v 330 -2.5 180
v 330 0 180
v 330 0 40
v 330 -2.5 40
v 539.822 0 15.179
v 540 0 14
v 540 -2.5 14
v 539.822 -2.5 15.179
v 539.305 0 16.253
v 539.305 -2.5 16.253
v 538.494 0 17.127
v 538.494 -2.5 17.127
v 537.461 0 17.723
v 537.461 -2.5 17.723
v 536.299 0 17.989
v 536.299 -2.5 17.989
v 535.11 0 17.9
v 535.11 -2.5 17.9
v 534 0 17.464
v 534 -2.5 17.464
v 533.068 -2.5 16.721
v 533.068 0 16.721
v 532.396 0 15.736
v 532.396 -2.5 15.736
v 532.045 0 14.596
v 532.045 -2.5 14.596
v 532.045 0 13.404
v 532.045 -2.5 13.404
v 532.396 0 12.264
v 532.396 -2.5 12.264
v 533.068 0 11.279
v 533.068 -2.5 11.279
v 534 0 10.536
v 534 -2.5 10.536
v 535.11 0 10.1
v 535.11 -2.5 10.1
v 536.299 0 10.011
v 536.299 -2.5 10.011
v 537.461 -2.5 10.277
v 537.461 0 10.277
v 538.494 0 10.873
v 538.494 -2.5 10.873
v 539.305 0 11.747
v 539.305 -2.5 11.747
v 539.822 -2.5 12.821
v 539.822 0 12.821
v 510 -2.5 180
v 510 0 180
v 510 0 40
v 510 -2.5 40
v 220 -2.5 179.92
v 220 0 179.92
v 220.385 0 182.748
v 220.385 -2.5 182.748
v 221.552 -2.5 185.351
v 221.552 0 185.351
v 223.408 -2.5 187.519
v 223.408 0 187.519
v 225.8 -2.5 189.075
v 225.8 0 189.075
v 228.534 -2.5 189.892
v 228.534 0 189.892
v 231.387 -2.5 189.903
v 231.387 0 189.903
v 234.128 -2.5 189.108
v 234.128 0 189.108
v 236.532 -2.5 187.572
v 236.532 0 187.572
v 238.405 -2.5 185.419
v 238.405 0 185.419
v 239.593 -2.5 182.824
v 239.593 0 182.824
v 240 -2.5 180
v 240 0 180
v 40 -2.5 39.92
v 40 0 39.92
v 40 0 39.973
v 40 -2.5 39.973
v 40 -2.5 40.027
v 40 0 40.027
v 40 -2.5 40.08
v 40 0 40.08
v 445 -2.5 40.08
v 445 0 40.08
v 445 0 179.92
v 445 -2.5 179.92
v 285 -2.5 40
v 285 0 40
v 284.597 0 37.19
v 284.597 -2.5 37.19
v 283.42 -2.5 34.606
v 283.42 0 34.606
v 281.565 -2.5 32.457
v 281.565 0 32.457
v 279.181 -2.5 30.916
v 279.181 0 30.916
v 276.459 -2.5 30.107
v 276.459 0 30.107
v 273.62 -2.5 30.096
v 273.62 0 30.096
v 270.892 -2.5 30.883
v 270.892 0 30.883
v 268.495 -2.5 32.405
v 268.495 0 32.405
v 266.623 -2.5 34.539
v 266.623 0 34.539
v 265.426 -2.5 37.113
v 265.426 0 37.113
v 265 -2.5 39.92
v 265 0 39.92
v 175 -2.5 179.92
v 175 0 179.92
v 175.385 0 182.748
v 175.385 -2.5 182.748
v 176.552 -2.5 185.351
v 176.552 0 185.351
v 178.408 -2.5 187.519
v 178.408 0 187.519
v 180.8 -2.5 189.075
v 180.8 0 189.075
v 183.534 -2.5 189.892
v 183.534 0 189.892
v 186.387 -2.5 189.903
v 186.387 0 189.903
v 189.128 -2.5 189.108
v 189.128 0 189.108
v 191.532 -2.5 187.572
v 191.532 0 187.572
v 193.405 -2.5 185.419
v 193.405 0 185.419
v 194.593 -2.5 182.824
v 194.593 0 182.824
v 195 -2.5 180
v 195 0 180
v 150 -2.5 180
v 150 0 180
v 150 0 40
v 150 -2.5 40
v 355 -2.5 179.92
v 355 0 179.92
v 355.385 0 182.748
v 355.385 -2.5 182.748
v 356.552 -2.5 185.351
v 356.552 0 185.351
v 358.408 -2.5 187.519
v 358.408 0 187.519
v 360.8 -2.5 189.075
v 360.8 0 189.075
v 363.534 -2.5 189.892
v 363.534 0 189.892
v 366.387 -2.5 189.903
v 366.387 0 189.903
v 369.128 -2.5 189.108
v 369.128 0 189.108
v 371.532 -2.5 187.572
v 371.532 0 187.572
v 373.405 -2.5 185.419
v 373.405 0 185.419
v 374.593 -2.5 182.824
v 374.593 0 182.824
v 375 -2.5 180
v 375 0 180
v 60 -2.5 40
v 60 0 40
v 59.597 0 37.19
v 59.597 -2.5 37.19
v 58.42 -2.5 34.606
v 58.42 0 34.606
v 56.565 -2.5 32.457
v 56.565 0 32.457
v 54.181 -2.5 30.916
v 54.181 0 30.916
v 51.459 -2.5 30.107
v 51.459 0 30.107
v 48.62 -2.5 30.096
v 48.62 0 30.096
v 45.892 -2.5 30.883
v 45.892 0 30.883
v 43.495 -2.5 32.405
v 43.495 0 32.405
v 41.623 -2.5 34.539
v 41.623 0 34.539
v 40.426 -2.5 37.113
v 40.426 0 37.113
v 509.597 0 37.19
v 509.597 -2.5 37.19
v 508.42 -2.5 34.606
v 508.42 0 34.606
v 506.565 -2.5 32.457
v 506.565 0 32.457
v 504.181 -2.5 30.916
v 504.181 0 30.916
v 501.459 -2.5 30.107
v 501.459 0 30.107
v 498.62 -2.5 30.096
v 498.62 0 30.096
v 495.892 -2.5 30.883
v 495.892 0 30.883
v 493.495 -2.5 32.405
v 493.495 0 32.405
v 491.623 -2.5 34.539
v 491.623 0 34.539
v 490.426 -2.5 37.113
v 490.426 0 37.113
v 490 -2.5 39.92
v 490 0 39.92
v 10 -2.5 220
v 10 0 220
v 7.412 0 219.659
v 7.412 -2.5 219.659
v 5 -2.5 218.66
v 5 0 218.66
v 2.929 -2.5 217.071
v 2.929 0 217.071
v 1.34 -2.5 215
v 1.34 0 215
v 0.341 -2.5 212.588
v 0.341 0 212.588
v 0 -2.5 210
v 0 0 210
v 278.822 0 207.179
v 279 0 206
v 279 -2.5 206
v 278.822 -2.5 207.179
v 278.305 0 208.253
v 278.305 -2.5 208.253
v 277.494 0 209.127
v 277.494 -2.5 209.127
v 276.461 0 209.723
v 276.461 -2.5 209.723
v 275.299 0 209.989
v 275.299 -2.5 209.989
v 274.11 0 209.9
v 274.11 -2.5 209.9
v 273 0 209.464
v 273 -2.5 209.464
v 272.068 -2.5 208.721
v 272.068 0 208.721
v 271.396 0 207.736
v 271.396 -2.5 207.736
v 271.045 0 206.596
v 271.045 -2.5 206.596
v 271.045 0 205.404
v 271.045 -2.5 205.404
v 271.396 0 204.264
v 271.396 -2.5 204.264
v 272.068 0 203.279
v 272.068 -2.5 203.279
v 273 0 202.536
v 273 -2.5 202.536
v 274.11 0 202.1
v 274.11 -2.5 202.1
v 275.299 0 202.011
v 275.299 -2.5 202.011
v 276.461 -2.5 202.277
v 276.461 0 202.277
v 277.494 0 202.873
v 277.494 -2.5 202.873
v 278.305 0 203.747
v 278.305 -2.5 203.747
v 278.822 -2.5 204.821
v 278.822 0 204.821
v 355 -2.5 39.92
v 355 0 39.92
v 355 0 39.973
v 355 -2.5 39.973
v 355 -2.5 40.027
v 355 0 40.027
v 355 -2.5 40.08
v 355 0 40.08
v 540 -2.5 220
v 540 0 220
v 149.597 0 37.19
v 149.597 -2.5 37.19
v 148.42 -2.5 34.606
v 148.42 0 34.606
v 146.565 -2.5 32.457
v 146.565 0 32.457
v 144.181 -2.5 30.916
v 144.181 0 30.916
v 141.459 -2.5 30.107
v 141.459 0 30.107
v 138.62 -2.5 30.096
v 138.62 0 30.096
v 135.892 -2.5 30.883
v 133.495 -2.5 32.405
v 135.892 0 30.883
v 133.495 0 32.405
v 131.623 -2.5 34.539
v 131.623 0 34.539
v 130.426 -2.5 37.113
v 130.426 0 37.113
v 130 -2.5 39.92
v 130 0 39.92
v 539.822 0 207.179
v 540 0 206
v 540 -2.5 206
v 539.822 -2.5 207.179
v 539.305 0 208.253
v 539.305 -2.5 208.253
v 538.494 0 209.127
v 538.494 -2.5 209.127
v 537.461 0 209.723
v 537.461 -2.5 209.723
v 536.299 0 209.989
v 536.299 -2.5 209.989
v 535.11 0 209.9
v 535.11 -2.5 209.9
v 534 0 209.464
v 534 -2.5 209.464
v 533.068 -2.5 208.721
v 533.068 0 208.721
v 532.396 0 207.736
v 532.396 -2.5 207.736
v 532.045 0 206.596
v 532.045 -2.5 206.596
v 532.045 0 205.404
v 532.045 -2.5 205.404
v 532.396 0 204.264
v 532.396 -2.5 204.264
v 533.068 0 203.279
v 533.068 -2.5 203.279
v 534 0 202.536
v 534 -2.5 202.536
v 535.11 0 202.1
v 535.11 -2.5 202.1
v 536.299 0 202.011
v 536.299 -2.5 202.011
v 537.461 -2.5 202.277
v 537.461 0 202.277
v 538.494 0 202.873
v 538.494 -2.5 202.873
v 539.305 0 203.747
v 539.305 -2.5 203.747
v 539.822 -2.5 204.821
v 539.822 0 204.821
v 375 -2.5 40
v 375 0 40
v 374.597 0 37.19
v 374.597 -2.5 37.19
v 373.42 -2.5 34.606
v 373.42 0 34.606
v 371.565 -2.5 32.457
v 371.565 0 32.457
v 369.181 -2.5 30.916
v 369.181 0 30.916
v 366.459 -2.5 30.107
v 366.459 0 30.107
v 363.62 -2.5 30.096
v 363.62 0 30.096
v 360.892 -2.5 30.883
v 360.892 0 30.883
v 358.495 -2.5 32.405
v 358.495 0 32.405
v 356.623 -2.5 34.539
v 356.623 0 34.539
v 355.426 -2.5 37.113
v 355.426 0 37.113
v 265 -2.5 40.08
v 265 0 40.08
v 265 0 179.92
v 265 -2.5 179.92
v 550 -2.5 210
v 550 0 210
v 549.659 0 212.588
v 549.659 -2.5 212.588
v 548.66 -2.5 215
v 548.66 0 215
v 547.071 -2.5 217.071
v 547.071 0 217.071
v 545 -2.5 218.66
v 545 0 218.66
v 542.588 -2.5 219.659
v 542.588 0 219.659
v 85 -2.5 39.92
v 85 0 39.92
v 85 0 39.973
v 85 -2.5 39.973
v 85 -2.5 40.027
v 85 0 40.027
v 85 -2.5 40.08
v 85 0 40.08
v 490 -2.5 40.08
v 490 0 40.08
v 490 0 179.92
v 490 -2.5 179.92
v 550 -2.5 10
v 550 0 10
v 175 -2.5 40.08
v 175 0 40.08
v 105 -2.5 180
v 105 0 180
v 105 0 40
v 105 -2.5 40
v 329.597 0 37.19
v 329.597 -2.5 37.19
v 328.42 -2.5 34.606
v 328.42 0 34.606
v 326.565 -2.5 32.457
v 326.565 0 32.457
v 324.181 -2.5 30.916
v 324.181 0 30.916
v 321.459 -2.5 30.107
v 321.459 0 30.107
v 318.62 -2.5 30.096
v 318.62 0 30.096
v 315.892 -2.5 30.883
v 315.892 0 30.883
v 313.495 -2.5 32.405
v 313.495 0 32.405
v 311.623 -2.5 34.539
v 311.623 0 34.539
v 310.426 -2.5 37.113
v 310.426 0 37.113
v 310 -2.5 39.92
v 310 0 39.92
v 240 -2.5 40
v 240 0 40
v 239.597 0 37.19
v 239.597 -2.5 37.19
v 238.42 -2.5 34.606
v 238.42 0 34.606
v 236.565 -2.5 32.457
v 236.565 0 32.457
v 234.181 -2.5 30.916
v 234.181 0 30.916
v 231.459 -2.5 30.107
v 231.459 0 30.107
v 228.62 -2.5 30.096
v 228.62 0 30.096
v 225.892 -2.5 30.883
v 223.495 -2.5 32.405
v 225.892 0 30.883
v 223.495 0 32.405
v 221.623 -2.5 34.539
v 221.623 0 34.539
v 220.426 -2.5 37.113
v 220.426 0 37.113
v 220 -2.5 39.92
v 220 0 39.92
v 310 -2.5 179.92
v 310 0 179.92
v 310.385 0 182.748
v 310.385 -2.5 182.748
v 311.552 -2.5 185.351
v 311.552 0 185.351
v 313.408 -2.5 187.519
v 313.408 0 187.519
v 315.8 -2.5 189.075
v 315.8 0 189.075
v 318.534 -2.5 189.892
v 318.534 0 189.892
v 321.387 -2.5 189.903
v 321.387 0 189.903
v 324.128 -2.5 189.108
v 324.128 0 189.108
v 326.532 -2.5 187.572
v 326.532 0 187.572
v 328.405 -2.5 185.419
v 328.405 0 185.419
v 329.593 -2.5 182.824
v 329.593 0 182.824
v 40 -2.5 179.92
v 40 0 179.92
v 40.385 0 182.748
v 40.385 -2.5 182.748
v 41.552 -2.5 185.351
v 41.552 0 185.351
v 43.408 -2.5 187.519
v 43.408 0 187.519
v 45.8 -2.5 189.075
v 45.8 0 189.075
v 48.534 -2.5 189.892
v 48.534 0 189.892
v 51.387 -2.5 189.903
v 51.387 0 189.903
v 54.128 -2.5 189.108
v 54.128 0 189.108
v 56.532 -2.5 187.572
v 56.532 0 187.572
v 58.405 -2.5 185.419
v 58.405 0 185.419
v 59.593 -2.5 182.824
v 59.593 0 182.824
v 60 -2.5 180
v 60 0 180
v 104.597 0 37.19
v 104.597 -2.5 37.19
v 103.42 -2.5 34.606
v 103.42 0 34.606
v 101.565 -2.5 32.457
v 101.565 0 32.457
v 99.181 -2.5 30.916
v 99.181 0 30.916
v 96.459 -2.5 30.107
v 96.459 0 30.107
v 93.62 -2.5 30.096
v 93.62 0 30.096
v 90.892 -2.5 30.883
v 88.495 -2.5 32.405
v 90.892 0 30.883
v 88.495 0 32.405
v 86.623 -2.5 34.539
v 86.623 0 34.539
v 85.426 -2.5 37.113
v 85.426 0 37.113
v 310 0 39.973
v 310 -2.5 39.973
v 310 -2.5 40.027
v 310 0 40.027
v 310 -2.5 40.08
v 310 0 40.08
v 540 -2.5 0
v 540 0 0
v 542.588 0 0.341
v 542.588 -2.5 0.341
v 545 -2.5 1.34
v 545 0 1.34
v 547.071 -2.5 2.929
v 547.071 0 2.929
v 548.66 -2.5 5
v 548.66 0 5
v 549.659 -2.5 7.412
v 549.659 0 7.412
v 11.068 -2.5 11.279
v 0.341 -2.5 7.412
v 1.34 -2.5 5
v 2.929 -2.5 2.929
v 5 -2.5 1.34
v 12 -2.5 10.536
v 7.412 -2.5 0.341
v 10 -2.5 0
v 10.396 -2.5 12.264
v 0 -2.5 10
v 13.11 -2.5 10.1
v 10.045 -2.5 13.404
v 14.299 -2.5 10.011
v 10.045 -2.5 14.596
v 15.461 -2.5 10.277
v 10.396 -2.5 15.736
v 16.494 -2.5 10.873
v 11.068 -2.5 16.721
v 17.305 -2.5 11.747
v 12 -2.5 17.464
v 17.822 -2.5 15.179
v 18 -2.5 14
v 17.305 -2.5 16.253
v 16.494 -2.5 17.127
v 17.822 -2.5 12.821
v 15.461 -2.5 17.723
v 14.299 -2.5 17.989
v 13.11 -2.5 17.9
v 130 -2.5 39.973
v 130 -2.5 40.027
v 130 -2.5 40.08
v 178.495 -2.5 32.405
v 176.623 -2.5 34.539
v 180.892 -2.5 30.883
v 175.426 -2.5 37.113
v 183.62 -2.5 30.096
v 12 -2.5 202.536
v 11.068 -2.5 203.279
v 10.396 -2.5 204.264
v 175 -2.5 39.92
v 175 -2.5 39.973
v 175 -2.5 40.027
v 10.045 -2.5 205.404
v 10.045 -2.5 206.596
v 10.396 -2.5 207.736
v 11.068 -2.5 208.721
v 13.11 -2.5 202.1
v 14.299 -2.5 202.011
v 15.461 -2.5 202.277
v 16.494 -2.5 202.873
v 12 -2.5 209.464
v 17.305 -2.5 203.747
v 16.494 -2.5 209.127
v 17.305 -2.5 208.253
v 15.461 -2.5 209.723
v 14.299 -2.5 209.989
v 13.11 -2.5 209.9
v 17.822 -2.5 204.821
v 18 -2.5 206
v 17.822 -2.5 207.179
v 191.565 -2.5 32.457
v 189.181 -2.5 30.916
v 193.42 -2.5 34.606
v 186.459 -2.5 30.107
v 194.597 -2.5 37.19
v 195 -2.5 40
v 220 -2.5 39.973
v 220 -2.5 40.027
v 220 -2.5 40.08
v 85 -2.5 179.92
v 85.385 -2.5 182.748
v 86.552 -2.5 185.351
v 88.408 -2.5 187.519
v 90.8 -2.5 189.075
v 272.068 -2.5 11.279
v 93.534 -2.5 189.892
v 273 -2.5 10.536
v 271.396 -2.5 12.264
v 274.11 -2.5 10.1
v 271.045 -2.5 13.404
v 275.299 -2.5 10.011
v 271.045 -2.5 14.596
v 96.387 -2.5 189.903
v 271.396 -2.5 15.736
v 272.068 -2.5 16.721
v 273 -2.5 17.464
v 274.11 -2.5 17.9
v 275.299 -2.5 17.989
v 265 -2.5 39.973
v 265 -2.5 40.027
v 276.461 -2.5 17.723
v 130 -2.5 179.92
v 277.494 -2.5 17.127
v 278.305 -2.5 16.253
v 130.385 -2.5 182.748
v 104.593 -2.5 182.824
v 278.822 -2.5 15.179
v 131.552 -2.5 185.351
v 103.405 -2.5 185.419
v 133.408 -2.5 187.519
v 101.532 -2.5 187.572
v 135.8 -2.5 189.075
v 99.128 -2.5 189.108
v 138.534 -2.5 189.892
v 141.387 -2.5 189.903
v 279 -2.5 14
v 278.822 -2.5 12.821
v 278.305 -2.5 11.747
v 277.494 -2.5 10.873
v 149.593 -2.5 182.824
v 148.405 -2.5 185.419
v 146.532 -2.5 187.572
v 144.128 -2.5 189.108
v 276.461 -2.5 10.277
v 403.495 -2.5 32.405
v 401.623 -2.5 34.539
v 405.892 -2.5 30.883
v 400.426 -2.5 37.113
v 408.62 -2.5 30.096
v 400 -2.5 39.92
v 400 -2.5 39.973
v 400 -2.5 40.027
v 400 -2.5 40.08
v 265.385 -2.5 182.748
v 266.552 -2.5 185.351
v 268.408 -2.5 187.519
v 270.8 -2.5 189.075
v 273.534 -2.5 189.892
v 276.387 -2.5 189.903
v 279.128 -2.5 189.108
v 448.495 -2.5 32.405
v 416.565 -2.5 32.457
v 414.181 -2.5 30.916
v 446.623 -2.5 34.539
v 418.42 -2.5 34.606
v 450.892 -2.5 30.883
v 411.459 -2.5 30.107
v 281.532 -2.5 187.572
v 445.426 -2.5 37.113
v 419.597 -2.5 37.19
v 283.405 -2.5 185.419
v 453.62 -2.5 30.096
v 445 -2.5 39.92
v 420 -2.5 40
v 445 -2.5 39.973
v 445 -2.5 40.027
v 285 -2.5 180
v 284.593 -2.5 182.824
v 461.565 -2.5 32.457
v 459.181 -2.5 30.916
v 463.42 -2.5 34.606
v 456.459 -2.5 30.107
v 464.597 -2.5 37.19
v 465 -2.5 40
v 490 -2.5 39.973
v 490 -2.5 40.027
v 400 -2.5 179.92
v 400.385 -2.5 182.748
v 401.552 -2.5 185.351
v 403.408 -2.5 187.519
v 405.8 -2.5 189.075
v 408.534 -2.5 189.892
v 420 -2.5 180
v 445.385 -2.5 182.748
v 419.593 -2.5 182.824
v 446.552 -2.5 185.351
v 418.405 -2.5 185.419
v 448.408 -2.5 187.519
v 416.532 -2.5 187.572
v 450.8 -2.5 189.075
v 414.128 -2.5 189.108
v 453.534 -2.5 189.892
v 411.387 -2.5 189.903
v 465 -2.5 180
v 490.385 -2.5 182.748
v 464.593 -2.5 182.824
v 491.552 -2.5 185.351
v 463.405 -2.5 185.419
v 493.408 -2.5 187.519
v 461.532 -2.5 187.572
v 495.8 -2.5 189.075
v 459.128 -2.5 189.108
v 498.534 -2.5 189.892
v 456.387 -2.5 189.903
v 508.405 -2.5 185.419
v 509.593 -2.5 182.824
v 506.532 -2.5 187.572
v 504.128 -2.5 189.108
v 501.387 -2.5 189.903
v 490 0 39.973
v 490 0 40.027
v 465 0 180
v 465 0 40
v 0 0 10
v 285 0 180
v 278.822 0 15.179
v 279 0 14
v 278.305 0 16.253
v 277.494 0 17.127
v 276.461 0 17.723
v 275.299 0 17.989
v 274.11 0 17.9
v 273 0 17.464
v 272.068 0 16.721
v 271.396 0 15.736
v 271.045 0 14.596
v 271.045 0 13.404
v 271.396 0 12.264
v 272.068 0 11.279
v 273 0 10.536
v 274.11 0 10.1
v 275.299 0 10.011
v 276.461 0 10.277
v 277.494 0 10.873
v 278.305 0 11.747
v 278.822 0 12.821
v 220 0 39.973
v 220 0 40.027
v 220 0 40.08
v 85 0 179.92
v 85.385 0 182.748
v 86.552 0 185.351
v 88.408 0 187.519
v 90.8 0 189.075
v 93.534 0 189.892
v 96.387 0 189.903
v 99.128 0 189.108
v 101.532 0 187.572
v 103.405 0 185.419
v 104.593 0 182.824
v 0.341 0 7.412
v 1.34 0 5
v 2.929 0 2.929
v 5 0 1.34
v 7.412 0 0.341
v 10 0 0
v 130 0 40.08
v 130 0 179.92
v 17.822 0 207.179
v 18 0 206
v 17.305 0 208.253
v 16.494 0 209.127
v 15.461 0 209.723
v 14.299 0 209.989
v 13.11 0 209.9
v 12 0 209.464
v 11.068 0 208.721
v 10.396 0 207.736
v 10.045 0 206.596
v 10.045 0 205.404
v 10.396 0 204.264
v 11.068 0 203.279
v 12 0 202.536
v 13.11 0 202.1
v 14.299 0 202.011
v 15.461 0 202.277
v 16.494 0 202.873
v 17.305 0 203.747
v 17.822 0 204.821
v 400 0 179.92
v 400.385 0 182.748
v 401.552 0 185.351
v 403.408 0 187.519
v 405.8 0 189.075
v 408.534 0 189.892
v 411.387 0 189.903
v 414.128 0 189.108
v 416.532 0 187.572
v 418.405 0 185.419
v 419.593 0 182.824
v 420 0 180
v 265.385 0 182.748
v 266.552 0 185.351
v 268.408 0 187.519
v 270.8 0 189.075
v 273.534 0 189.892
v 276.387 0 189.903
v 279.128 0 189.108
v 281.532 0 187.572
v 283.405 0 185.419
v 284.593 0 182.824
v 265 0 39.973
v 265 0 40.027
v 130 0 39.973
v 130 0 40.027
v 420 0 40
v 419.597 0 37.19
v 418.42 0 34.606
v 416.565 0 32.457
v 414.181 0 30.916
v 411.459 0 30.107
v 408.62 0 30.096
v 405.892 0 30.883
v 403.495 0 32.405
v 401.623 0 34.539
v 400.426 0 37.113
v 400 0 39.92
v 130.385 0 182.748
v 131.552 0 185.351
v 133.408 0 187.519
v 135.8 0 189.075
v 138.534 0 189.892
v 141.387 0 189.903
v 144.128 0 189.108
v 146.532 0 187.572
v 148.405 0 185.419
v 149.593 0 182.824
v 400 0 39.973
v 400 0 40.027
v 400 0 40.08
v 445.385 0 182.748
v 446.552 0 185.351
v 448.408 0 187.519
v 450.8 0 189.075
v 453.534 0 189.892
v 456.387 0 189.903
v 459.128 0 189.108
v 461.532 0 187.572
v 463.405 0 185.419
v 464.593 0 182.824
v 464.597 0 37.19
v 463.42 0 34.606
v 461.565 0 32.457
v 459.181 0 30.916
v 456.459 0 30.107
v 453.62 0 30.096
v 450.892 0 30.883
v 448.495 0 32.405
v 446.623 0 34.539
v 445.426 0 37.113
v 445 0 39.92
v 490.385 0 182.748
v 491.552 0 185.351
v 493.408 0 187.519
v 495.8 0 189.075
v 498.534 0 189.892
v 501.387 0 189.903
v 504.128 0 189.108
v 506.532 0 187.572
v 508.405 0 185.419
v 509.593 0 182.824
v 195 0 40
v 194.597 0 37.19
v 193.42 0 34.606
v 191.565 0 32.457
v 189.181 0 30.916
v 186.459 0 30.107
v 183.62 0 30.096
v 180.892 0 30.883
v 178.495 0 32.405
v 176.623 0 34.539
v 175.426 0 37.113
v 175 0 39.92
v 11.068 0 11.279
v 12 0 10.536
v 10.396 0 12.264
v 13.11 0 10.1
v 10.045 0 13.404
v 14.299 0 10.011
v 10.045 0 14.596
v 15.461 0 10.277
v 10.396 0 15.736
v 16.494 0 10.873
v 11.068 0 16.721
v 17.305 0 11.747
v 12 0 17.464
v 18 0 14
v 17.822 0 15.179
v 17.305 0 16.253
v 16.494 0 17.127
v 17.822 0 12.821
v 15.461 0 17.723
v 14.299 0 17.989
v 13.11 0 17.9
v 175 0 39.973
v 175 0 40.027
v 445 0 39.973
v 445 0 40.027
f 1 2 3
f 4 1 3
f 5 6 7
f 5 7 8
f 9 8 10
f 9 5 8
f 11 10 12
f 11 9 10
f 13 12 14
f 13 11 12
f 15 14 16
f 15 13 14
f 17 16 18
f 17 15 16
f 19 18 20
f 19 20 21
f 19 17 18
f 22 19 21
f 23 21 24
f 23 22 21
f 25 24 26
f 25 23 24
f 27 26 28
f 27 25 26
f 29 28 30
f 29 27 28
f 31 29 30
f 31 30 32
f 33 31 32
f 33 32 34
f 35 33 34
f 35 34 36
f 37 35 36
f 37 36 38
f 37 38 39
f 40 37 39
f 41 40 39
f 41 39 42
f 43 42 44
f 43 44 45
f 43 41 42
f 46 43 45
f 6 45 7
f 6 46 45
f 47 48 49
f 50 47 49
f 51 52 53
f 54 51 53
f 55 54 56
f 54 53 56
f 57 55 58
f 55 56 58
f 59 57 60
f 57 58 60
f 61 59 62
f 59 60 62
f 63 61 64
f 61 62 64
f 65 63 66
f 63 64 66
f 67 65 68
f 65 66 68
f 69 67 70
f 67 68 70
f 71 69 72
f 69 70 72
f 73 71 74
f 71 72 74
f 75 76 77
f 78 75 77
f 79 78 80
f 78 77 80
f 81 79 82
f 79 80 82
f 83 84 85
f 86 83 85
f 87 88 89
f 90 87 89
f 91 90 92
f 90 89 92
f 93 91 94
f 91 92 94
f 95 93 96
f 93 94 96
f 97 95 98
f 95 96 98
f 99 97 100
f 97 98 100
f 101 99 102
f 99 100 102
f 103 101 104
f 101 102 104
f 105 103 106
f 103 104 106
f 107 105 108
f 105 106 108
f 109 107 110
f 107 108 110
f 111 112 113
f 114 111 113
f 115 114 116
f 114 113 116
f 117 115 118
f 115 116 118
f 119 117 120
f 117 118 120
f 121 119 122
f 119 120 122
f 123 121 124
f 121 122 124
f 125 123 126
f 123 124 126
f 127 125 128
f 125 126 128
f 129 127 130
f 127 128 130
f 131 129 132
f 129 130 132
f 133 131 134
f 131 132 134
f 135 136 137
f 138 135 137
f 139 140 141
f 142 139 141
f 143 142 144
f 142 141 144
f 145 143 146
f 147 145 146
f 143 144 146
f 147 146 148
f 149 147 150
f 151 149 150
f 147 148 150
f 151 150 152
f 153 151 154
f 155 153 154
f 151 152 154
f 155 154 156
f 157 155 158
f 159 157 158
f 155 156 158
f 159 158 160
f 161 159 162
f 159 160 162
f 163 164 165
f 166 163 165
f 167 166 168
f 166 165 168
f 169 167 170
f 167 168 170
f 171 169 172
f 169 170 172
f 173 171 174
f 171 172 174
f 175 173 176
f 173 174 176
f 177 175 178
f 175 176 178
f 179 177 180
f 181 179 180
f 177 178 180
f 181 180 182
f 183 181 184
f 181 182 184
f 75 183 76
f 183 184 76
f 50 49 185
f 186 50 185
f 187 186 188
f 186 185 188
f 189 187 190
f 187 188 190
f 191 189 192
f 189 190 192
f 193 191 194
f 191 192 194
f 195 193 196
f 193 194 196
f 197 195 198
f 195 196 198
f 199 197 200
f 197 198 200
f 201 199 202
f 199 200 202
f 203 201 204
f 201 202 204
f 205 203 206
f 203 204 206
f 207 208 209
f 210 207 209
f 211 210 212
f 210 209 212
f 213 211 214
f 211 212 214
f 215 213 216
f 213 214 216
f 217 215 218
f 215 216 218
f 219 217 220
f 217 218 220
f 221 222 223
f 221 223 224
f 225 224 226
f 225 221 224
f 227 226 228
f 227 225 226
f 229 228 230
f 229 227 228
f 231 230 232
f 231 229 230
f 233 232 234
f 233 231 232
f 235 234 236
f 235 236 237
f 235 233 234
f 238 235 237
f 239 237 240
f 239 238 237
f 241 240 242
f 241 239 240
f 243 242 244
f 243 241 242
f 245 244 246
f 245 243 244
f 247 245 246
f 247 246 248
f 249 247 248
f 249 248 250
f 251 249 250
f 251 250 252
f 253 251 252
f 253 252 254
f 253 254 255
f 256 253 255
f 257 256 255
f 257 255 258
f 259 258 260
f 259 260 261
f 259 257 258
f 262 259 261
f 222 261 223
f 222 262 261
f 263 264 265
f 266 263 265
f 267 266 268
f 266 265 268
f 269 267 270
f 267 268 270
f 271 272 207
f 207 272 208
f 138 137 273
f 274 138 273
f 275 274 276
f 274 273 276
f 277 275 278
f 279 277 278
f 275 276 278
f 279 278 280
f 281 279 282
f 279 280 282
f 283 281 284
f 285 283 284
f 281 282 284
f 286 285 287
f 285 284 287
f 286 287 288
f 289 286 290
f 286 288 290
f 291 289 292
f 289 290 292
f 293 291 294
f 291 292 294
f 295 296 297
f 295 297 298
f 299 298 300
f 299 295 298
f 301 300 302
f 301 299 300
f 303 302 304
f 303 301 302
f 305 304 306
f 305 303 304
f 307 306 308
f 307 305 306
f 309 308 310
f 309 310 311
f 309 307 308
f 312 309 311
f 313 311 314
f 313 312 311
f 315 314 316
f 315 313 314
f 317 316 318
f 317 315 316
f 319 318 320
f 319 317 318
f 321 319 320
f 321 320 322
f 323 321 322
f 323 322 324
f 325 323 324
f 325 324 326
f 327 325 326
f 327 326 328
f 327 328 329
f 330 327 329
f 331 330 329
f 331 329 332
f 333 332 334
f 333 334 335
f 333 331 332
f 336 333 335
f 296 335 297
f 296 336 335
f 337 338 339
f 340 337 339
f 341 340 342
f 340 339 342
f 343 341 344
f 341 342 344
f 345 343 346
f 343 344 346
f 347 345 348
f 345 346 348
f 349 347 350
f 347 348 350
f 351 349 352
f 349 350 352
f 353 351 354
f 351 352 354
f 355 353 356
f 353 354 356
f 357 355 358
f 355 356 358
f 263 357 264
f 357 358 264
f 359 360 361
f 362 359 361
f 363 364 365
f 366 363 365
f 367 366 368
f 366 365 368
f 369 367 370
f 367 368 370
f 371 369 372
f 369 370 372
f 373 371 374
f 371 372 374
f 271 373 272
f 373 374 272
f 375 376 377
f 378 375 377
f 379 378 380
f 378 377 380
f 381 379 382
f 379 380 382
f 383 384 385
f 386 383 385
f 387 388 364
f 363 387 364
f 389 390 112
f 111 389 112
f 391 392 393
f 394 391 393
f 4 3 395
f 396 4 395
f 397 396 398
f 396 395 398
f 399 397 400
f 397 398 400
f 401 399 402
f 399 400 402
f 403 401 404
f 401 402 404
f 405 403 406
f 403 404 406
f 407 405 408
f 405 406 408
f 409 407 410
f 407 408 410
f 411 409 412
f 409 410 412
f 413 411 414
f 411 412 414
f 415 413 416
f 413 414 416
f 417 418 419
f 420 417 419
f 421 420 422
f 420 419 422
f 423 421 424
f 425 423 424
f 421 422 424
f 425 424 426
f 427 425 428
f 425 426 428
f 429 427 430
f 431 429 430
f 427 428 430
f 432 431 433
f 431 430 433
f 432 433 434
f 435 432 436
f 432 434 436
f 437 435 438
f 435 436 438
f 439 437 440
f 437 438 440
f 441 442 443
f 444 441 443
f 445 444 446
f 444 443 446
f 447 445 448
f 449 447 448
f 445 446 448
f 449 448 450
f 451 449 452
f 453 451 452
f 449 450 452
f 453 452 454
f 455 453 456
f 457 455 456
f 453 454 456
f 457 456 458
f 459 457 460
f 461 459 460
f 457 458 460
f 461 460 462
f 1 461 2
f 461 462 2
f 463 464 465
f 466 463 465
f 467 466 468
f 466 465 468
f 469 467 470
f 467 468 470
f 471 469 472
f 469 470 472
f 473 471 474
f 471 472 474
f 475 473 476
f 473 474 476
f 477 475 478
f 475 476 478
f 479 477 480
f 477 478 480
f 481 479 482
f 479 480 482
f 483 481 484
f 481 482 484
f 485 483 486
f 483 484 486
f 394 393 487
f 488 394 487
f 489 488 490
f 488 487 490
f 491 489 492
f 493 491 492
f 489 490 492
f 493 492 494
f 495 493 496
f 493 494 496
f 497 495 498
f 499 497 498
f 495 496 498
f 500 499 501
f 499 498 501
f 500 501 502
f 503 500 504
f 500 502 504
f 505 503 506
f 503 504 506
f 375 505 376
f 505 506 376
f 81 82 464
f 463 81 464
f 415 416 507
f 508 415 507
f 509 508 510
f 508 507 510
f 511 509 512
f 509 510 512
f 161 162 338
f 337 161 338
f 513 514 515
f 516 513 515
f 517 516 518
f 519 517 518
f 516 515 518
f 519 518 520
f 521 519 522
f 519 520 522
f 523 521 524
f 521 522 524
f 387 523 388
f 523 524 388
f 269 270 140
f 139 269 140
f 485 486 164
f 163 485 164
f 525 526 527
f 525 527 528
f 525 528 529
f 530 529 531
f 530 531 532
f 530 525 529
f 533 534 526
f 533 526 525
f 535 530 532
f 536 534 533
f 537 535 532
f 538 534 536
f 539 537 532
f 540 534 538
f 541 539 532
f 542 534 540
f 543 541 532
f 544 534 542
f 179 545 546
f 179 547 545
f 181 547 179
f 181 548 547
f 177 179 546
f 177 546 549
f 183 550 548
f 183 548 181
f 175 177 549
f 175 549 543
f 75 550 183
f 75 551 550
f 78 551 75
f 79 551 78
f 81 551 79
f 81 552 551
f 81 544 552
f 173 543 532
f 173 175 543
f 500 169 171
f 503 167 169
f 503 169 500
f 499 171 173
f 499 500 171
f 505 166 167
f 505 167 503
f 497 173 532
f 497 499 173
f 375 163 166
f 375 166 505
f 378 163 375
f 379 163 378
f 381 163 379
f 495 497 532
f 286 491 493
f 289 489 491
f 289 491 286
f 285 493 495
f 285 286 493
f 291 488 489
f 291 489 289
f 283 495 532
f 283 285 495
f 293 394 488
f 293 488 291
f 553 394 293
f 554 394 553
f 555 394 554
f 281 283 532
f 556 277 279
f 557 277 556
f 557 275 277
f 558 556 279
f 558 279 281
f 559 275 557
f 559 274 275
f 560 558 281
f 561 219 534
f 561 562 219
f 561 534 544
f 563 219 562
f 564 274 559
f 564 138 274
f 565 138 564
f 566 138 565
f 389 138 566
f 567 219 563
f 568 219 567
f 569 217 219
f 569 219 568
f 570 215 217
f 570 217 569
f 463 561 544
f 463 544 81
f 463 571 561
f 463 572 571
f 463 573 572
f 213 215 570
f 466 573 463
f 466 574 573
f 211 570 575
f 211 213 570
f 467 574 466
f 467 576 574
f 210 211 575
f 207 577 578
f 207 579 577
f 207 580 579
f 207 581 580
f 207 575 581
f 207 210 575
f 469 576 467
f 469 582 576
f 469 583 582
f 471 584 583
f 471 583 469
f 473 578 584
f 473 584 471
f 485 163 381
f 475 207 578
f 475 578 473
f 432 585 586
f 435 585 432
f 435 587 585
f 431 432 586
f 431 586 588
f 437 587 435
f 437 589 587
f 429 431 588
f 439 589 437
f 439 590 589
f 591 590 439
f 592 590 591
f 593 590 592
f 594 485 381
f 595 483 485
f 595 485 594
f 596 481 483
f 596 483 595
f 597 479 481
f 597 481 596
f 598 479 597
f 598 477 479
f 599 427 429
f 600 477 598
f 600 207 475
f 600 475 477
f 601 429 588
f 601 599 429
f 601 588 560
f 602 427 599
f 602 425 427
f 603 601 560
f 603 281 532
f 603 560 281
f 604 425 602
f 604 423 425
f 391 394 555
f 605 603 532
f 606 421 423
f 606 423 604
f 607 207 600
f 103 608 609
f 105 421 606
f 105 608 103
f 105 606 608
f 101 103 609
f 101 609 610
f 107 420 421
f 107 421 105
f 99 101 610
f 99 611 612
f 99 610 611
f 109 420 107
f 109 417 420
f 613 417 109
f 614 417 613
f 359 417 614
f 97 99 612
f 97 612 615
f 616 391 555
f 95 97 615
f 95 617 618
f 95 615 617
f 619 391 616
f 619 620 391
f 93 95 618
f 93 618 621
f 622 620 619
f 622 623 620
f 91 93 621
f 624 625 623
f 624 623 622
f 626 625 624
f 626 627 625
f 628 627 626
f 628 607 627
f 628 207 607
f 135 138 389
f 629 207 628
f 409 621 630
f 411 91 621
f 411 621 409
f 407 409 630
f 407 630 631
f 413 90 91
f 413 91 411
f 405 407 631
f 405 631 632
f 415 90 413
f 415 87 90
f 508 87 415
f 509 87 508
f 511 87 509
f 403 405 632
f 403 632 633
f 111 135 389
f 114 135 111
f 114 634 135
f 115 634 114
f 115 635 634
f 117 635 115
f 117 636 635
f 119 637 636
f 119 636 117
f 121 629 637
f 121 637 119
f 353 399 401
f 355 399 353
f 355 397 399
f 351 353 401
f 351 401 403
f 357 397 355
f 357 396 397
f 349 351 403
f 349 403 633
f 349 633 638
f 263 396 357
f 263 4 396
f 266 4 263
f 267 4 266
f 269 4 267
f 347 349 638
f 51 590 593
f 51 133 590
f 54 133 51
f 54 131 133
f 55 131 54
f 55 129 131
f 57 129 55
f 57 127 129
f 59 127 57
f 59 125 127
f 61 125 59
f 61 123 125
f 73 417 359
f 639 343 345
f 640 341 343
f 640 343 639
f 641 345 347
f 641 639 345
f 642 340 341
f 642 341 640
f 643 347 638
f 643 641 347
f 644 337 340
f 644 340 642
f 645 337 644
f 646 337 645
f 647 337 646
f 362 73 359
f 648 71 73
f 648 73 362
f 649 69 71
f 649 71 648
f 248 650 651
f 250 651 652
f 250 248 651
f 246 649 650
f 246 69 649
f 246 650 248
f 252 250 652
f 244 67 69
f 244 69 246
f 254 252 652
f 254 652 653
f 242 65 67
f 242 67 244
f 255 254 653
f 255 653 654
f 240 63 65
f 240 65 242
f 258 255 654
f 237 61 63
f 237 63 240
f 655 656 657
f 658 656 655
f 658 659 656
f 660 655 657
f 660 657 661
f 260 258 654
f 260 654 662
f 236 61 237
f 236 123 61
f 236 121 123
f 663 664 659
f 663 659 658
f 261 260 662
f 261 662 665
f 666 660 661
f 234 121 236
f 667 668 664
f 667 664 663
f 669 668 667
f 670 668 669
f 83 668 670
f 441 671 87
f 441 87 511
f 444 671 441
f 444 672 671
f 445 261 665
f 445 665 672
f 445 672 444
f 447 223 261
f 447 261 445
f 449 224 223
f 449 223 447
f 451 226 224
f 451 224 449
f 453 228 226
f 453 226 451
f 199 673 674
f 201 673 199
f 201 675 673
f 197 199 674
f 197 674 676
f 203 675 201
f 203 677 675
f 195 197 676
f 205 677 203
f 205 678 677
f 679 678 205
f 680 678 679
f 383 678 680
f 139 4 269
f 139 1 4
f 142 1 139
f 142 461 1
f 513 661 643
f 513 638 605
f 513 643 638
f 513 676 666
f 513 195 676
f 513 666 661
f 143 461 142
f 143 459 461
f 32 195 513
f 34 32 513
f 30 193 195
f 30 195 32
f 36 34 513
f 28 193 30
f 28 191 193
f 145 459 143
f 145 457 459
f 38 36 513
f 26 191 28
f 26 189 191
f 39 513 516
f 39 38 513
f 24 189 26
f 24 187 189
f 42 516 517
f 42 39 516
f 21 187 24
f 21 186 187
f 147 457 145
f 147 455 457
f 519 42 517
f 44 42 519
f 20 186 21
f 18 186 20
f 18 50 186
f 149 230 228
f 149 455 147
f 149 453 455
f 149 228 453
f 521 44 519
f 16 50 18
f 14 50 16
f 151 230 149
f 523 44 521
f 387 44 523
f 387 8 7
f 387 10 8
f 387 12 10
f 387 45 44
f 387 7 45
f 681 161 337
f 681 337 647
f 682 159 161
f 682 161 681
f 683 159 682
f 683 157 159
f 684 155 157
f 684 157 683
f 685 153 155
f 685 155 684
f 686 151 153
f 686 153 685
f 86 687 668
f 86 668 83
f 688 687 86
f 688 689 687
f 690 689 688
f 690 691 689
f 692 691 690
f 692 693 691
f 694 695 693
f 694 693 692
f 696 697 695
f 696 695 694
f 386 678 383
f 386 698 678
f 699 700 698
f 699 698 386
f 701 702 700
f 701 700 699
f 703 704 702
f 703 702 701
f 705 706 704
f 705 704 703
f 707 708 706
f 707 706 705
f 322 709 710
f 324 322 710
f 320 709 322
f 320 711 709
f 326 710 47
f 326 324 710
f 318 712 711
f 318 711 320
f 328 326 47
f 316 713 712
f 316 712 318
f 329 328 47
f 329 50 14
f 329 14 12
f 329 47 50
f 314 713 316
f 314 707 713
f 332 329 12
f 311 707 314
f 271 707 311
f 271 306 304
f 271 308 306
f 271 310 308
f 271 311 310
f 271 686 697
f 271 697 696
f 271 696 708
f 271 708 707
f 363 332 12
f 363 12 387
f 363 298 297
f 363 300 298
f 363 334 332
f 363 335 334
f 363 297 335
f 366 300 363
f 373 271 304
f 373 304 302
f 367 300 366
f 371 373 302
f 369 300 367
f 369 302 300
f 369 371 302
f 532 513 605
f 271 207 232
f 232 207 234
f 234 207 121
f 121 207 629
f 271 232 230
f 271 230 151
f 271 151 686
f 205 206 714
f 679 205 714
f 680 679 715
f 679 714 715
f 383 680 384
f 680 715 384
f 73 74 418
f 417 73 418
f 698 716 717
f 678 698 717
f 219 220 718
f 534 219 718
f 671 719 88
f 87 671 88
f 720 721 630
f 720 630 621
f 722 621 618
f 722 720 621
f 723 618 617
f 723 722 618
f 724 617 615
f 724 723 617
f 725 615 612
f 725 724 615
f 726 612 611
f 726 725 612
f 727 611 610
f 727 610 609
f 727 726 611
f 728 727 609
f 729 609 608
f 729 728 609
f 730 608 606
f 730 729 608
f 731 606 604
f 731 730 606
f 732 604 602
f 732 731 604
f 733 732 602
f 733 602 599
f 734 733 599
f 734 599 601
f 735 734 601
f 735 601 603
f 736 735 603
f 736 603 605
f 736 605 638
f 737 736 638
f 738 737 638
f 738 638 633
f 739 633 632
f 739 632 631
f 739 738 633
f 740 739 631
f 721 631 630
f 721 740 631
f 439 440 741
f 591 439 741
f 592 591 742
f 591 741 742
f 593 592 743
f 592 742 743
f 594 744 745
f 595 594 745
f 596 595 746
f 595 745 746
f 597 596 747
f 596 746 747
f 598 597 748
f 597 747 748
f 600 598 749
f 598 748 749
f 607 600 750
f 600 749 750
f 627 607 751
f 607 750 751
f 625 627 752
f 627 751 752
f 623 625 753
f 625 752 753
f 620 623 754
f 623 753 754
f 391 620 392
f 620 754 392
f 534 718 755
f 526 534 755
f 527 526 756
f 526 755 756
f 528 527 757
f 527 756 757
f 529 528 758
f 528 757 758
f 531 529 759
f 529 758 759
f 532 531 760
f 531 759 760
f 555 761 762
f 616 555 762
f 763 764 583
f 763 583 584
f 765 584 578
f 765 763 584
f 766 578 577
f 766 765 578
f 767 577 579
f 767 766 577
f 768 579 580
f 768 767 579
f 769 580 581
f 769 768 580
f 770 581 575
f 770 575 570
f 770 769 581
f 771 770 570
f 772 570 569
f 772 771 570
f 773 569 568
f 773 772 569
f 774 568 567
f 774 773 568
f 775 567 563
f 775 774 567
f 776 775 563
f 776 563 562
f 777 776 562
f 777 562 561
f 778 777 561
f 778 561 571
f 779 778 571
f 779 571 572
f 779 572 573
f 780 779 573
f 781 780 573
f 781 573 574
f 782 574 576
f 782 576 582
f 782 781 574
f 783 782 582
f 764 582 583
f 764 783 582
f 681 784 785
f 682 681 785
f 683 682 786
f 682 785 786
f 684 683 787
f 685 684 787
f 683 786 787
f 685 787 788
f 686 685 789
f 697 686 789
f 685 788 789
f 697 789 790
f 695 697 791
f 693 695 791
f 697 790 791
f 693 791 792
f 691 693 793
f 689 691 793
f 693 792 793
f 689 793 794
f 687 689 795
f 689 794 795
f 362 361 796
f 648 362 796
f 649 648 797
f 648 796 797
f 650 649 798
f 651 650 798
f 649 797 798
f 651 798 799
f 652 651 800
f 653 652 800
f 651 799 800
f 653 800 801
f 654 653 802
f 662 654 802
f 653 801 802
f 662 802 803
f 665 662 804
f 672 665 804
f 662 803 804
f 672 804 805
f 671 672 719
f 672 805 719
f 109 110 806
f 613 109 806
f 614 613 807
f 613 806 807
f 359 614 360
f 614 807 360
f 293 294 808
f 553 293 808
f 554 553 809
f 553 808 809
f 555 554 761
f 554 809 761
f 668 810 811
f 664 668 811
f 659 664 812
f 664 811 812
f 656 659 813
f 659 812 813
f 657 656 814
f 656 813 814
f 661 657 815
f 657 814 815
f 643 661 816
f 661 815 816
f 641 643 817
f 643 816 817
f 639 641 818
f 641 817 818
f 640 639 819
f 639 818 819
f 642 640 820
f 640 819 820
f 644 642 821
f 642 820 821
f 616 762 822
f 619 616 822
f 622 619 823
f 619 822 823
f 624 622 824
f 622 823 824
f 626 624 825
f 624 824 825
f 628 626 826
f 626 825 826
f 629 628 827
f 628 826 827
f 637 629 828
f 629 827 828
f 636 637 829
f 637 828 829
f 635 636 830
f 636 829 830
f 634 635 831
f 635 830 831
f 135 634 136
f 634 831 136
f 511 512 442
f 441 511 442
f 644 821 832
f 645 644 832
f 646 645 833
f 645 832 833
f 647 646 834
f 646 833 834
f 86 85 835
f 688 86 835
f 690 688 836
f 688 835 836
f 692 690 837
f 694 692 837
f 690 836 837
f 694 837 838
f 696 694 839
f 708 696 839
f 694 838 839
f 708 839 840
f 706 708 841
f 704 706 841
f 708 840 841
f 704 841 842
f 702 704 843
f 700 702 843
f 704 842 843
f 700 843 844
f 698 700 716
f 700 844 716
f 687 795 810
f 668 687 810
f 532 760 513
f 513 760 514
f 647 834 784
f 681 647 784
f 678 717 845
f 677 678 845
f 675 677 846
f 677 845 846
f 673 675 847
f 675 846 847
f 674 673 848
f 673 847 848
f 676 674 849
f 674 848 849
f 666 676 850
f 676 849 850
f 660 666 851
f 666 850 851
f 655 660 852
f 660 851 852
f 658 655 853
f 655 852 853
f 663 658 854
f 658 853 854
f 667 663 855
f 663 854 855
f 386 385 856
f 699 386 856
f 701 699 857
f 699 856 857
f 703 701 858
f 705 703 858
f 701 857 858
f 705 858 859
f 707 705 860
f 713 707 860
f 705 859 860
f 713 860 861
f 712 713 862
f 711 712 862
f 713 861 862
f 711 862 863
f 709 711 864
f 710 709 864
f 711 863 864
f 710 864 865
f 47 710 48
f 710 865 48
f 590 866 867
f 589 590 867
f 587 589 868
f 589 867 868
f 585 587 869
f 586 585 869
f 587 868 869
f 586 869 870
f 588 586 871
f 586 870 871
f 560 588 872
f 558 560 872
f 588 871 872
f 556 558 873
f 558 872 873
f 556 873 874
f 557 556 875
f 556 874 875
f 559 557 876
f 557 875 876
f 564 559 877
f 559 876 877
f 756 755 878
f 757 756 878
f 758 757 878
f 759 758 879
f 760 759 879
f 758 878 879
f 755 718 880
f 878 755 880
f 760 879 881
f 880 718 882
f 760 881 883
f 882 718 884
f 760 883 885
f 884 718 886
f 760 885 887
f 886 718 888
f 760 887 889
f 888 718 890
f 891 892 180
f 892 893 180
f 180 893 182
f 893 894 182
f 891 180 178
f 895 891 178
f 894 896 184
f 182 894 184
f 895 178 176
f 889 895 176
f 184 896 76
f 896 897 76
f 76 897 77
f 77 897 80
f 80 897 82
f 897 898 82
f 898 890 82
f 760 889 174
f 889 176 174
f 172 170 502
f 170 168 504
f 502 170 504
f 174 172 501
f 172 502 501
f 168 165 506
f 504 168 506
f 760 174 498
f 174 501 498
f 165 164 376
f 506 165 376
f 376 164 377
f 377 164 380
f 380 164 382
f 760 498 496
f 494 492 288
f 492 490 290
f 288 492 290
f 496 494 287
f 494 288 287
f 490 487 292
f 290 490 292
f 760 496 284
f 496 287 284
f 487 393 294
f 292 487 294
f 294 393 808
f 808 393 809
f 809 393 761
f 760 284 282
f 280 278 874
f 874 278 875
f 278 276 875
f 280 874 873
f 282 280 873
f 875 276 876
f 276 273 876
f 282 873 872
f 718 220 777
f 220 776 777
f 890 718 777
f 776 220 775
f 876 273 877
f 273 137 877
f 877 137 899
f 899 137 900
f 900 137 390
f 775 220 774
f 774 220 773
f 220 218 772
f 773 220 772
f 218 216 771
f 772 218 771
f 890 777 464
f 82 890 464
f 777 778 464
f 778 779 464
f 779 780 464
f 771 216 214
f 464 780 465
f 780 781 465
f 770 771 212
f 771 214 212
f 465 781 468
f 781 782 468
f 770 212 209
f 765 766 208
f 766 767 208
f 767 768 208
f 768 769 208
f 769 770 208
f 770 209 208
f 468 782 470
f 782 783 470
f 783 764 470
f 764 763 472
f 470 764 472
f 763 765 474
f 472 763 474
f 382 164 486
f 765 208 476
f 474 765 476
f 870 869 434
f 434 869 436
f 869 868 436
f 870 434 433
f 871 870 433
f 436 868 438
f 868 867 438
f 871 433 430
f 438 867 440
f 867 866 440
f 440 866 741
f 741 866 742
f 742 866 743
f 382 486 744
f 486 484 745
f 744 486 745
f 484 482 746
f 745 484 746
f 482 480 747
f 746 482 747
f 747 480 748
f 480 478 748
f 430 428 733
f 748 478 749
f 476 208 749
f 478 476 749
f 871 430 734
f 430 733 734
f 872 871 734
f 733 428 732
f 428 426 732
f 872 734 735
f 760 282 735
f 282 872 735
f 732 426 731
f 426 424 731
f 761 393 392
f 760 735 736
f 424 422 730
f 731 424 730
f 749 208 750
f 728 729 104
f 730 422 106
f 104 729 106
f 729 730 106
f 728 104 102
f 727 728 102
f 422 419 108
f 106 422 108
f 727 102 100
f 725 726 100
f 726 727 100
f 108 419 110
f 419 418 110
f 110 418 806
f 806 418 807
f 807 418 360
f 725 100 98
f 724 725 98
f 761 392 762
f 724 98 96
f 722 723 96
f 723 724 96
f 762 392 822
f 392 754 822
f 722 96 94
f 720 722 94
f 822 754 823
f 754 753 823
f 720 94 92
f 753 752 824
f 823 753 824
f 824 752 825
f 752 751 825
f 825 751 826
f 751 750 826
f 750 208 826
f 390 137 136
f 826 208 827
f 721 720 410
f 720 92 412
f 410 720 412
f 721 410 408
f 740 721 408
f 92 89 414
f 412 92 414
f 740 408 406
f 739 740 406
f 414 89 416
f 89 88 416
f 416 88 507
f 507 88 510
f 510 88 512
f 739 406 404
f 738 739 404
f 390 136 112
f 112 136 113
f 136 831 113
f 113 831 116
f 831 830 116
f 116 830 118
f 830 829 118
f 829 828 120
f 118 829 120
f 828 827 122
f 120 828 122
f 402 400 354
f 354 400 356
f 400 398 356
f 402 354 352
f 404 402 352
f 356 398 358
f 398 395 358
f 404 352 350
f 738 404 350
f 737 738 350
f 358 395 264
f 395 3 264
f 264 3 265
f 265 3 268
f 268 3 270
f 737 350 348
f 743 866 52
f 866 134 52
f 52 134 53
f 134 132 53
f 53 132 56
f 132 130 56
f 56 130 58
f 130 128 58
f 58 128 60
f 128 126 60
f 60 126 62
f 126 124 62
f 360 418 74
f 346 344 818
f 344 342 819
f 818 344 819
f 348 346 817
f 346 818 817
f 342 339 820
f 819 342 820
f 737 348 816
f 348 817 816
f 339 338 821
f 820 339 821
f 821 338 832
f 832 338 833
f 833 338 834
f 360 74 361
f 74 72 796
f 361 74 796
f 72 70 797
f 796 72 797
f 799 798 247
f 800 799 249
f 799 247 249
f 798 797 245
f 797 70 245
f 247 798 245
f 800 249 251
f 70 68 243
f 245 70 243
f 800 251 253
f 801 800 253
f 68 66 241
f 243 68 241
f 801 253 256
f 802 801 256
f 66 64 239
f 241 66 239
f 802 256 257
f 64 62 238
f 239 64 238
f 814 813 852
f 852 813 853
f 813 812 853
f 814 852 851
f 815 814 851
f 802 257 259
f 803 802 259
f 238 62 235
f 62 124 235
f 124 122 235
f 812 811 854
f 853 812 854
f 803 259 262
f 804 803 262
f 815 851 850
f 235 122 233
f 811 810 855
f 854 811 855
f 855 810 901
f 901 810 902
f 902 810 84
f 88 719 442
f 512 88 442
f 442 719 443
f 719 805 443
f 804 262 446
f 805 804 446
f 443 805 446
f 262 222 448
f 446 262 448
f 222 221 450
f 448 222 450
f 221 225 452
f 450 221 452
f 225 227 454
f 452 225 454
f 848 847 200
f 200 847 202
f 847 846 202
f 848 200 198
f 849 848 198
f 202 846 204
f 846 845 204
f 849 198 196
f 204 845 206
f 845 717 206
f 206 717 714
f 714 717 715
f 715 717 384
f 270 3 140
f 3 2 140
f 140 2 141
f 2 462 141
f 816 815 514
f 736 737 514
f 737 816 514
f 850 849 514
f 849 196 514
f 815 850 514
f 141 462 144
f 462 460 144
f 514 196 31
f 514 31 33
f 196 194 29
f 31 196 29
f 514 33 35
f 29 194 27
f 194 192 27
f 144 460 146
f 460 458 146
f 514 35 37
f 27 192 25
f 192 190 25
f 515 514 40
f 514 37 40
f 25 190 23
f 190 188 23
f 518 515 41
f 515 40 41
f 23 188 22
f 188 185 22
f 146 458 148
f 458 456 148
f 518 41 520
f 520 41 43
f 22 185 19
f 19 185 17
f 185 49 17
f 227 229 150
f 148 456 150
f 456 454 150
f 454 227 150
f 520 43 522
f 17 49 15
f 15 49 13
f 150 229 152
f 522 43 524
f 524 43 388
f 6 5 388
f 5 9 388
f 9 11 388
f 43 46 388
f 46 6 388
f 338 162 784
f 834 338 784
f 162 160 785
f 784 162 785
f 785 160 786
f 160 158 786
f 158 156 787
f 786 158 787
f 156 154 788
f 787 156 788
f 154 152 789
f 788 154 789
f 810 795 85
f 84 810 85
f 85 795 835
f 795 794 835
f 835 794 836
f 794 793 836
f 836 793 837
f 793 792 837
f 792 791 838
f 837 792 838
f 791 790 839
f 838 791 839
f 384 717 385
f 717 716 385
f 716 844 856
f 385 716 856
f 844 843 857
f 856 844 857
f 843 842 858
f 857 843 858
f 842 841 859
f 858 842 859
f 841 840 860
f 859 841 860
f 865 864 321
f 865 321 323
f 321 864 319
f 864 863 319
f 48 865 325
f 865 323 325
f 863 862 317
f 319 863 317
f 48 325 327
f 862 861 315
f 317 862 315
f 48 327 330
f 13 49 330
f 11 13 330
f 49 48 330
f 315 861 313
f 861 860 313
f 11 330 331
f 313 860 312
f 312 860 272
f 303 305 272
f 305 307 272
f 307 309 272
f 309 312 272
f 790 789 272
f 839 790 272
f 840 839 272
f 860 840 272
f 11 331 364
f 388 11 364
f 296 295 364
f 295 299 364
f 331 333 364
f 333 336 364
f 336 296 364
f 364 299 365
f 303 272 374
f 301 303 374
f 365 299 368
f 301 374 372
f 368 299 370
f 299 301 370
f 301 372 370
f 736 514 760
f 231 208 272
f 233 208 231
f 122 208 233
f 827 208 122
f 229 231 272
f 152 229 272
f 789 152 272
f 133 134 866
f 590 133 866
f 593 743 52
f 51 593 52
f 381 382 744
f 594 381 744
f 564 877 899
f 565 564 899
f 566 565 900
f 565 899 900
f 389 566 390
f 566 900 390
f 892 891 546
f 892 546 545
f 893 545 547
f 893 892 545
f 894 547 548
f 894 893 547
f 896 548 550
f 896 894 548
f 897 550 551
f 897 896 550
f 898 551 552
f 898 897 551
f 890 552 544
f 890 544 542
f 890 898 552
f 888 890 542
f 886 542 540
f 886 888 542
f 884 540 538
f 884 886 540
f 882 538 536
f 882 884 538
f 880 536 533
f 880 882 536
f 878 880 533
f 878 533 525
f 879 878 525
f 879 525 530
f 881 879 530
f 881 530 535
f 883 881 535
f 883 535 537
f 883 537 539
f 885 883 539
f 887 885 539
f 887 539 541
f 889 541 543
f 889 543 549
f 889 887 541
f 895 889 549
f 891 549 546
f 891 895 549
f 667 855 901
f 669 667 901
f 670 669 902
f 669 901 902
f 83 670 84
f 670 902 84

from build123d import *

# Parameters (mm, degrees)
F0_R     = 4
F1_DEPTH = 2.5


with BuildPart() as f1:
    # F0 (on Front) → F1 (new body)
    with BuildSketch(Plane.XZ):
        with BuildLine():
            ThreePointArc((0, 10), (2.928932, 2.928932), (10, 0))
            Line((10, 0), (540, 0))
            ThreePointArc((540, 0), (547.071068, 2.928932), (550, 10))
            Line((550, 10), (550, 210))
            ThreePointArc((550, 210), (547.071068, 217.071068), (540, 220))
            Line((540, 220), (10, 220))
            ThreePointArc((10, 220), (2.928932, 217.071068), (0, 210))
            Line((0, 210), (0, 10))
        make_face()
        with Locations((14, 14)):
            Circle(F0_R, mode=Mode.SUBTRACT)
        with BuildLine():
            Line((220.000318, 40.079729), (220.000318, 179.920271))
            ThreePointArc((220.000318, 179.920271), (229.960135, 189.999921), (240, 180))
            Line((240, 180), (240, 40))
            ThreePointArc((240, 40), (230.039865, 30.000079), (220.000318, 39.920271))
            ThreePointArc((220.000318, 39.920271), (220, 40), (220.000318, 40.079729))
        make_face(mode=Mode.SUBTRACT)
        with Locations((275, 14)):
            Circle(F0_R, mode=Mode.SUBTRACT)
        with Locations((536, 14)):
            Circle(F0_R, mode=Mode.SUBTRACT)
        with BuildLine():
            Line((265.000318, 40.079729), (265.000318, 179.920271))
            ThreePointArc((265.000318, 179.920271), (274.960135, 189.999921), (285, 180))
            Line((285, 180), (285, 40))
            ThreePointArc((285, 40), (275.039865, 30.000079), (265.000318, 39.920271))
            ThreePointArc((265.000318, 39.920271), (265, 40), (265.000318, 40.079729))
        make_face(mode=Mode.SUBTRACT)
        with BuildLine():
            ThreePointArc((40.000318, 179.920271), (49.960135, 189.999921), (60, 180))
            Line((60, 180), (60, 40))
            ThreePointArc((60, 40), (50.039865, 30.000079), (40.000318, 39.920271))
            ThreePointArc((40.000318, 39.920271), (40, 40), (40.000318, 40.079729))
            Line((40.000318, 40.079729), (40.000318, 179.920271))
        make_face(mode=Mode.SUBTRACT)
        with BuildLine():
            Line((85.000318, 40.079729), (85.000318, 179.920271))
            ThreePointArc((85.000318, 179.920271), (94.960135, 189.999921), (105, 180))
            Line((105, 180), (105, 40))
            ThreePointArc((105, 40), (95.039865, 30.000079), (85.000318, 39.920271))
            ThreePointArc((85.000318, 39.920271), (85, 40), (85.000318, 40.079729))
        make_face(mode=Mode.SUBTRACT)
        with BuildLine():
            Line((130.000318, 40.079729), (130.000318, 179.920271))
            ThreePointArc((130.000318, 179.920271), (139.960135, 189.999921), (150, 180))
            Line((150, 180), (150, 40))
            ThreePointArc((150, 40), (140.039865, 30.000079), (130.000318, 39.920271))
            ThreePointArc((130.000318, 39.920271), (130, 40), (130.000318, 40.079729))
        make_face(mode=Mode.SUBTRACT)
        with BuildLine():
            Line((175.000318, 40.079729), (175.000318, 179.920271))
            ThreePointArc((175.000318, 179.920271), (184.960135, 189.999921), (195, 180))
            Line((195, 180), (195, 40))
            ThreePointArc((195, 40), (185.039865, 30.000079), (175.000318, 39.920271))
            ThreePointArc((175.000318, 39.920271), (175, 40), (175.000318, 40.079729))
        make_face(mode=Mode.SUBTRACT)
        with Locations((14, 206)):
            Circle(F0_R, mode=Mode.SUBTRACT)
        with BuildLine():
            Line((310.000318, 40.079729), (310.000318, 179.920271))
            ThreePointArc((310.000318, 179.920271), (319.960135, 189.999921), (330, 180))
            Line((330, 180), (330, 40))
            ThreePointArc((330, 40), (320.039865, 30.000079), (310.000318, 39.920271))
            ThreePointArc((310.000318, 39.920271), (310, 40), (310.000318, 40.079729))
        make_face(mode=Mode.SUBTRACT)
        with BuildLine():
            Line((355.000318, 40.079729), (355.000318, 179.920271))
            ThreePointArc((355.000318, 179.920271), (364.960135, 189.999921), (375, 180))
            Line((375, 180), (375, 40))
            ThreePointArc((375, 40), (365.039865, 30.000079), (355.000318, 39.920271))
            ThreePointArc((355.000318, 39.920271), (355, 40), (355.000318, 40.079729))
        make_face(mode=Mode.SUBTRACT)
        with BuildLine():
            Line((400.000318, 40.079729), (400.000318, 179.920271))
            ThreePointArc((400.000318, 179.920271), (409.960135, 189.999921), (420, 180))
            Line((420, 180), (420, 40))
            ThreePointArc((420, 40), (410.039865, 30.000079), (400.000318, 39.920271))
            ThreePointArc((400.000318, 39.920271), (400, 40), (400.000318, 40.079729))
        make_face(mode=Mode.SUBTRACT)
        with BuildLine():
            Line((445.000318, 40.079729), (445.000318, 179.920271))
            ThreePointArc((445.000318, 179.920271), (454.960135, 189.999921), (465, 180))
            Line((465, 180), (465, 40))
            ThreePointArc((465, 40), (455.039865, 30.000079), (445.000318, 39.920271))
            ThreePointArc((445.000318, 39.920271), (445, 40), (445.000318, 40.079729))
        make_face(mode=Mode.SUBTRACT)
        with BuildLine():
            Line((490.000318, 40.079729), (490.000318, 179.920271))
            ThreePointArc((490.000318, 179.920271), (499.960135, 189.999921), (510, 180))
            Line((510, 180), (510, 40))
            ThreePointArc((510, 40), (500.039865, 30.000079), (490.000318, 39.920271))
            ThreePointArc((490.000318, 39.920271), (490, 40), (490.000318, 40.079729))
        make_face(mode=Mode.SUBTRACT)
        with Locations((275, 206)):
            Circle(F0_R, mode=Mode.SUBTRACT)
        with Locations((536, 206)):
            Circle(F0_R, mode=Mode.SUBTRACT)
    extrude(amount=F1_DEPTH)


solid = f1.part
